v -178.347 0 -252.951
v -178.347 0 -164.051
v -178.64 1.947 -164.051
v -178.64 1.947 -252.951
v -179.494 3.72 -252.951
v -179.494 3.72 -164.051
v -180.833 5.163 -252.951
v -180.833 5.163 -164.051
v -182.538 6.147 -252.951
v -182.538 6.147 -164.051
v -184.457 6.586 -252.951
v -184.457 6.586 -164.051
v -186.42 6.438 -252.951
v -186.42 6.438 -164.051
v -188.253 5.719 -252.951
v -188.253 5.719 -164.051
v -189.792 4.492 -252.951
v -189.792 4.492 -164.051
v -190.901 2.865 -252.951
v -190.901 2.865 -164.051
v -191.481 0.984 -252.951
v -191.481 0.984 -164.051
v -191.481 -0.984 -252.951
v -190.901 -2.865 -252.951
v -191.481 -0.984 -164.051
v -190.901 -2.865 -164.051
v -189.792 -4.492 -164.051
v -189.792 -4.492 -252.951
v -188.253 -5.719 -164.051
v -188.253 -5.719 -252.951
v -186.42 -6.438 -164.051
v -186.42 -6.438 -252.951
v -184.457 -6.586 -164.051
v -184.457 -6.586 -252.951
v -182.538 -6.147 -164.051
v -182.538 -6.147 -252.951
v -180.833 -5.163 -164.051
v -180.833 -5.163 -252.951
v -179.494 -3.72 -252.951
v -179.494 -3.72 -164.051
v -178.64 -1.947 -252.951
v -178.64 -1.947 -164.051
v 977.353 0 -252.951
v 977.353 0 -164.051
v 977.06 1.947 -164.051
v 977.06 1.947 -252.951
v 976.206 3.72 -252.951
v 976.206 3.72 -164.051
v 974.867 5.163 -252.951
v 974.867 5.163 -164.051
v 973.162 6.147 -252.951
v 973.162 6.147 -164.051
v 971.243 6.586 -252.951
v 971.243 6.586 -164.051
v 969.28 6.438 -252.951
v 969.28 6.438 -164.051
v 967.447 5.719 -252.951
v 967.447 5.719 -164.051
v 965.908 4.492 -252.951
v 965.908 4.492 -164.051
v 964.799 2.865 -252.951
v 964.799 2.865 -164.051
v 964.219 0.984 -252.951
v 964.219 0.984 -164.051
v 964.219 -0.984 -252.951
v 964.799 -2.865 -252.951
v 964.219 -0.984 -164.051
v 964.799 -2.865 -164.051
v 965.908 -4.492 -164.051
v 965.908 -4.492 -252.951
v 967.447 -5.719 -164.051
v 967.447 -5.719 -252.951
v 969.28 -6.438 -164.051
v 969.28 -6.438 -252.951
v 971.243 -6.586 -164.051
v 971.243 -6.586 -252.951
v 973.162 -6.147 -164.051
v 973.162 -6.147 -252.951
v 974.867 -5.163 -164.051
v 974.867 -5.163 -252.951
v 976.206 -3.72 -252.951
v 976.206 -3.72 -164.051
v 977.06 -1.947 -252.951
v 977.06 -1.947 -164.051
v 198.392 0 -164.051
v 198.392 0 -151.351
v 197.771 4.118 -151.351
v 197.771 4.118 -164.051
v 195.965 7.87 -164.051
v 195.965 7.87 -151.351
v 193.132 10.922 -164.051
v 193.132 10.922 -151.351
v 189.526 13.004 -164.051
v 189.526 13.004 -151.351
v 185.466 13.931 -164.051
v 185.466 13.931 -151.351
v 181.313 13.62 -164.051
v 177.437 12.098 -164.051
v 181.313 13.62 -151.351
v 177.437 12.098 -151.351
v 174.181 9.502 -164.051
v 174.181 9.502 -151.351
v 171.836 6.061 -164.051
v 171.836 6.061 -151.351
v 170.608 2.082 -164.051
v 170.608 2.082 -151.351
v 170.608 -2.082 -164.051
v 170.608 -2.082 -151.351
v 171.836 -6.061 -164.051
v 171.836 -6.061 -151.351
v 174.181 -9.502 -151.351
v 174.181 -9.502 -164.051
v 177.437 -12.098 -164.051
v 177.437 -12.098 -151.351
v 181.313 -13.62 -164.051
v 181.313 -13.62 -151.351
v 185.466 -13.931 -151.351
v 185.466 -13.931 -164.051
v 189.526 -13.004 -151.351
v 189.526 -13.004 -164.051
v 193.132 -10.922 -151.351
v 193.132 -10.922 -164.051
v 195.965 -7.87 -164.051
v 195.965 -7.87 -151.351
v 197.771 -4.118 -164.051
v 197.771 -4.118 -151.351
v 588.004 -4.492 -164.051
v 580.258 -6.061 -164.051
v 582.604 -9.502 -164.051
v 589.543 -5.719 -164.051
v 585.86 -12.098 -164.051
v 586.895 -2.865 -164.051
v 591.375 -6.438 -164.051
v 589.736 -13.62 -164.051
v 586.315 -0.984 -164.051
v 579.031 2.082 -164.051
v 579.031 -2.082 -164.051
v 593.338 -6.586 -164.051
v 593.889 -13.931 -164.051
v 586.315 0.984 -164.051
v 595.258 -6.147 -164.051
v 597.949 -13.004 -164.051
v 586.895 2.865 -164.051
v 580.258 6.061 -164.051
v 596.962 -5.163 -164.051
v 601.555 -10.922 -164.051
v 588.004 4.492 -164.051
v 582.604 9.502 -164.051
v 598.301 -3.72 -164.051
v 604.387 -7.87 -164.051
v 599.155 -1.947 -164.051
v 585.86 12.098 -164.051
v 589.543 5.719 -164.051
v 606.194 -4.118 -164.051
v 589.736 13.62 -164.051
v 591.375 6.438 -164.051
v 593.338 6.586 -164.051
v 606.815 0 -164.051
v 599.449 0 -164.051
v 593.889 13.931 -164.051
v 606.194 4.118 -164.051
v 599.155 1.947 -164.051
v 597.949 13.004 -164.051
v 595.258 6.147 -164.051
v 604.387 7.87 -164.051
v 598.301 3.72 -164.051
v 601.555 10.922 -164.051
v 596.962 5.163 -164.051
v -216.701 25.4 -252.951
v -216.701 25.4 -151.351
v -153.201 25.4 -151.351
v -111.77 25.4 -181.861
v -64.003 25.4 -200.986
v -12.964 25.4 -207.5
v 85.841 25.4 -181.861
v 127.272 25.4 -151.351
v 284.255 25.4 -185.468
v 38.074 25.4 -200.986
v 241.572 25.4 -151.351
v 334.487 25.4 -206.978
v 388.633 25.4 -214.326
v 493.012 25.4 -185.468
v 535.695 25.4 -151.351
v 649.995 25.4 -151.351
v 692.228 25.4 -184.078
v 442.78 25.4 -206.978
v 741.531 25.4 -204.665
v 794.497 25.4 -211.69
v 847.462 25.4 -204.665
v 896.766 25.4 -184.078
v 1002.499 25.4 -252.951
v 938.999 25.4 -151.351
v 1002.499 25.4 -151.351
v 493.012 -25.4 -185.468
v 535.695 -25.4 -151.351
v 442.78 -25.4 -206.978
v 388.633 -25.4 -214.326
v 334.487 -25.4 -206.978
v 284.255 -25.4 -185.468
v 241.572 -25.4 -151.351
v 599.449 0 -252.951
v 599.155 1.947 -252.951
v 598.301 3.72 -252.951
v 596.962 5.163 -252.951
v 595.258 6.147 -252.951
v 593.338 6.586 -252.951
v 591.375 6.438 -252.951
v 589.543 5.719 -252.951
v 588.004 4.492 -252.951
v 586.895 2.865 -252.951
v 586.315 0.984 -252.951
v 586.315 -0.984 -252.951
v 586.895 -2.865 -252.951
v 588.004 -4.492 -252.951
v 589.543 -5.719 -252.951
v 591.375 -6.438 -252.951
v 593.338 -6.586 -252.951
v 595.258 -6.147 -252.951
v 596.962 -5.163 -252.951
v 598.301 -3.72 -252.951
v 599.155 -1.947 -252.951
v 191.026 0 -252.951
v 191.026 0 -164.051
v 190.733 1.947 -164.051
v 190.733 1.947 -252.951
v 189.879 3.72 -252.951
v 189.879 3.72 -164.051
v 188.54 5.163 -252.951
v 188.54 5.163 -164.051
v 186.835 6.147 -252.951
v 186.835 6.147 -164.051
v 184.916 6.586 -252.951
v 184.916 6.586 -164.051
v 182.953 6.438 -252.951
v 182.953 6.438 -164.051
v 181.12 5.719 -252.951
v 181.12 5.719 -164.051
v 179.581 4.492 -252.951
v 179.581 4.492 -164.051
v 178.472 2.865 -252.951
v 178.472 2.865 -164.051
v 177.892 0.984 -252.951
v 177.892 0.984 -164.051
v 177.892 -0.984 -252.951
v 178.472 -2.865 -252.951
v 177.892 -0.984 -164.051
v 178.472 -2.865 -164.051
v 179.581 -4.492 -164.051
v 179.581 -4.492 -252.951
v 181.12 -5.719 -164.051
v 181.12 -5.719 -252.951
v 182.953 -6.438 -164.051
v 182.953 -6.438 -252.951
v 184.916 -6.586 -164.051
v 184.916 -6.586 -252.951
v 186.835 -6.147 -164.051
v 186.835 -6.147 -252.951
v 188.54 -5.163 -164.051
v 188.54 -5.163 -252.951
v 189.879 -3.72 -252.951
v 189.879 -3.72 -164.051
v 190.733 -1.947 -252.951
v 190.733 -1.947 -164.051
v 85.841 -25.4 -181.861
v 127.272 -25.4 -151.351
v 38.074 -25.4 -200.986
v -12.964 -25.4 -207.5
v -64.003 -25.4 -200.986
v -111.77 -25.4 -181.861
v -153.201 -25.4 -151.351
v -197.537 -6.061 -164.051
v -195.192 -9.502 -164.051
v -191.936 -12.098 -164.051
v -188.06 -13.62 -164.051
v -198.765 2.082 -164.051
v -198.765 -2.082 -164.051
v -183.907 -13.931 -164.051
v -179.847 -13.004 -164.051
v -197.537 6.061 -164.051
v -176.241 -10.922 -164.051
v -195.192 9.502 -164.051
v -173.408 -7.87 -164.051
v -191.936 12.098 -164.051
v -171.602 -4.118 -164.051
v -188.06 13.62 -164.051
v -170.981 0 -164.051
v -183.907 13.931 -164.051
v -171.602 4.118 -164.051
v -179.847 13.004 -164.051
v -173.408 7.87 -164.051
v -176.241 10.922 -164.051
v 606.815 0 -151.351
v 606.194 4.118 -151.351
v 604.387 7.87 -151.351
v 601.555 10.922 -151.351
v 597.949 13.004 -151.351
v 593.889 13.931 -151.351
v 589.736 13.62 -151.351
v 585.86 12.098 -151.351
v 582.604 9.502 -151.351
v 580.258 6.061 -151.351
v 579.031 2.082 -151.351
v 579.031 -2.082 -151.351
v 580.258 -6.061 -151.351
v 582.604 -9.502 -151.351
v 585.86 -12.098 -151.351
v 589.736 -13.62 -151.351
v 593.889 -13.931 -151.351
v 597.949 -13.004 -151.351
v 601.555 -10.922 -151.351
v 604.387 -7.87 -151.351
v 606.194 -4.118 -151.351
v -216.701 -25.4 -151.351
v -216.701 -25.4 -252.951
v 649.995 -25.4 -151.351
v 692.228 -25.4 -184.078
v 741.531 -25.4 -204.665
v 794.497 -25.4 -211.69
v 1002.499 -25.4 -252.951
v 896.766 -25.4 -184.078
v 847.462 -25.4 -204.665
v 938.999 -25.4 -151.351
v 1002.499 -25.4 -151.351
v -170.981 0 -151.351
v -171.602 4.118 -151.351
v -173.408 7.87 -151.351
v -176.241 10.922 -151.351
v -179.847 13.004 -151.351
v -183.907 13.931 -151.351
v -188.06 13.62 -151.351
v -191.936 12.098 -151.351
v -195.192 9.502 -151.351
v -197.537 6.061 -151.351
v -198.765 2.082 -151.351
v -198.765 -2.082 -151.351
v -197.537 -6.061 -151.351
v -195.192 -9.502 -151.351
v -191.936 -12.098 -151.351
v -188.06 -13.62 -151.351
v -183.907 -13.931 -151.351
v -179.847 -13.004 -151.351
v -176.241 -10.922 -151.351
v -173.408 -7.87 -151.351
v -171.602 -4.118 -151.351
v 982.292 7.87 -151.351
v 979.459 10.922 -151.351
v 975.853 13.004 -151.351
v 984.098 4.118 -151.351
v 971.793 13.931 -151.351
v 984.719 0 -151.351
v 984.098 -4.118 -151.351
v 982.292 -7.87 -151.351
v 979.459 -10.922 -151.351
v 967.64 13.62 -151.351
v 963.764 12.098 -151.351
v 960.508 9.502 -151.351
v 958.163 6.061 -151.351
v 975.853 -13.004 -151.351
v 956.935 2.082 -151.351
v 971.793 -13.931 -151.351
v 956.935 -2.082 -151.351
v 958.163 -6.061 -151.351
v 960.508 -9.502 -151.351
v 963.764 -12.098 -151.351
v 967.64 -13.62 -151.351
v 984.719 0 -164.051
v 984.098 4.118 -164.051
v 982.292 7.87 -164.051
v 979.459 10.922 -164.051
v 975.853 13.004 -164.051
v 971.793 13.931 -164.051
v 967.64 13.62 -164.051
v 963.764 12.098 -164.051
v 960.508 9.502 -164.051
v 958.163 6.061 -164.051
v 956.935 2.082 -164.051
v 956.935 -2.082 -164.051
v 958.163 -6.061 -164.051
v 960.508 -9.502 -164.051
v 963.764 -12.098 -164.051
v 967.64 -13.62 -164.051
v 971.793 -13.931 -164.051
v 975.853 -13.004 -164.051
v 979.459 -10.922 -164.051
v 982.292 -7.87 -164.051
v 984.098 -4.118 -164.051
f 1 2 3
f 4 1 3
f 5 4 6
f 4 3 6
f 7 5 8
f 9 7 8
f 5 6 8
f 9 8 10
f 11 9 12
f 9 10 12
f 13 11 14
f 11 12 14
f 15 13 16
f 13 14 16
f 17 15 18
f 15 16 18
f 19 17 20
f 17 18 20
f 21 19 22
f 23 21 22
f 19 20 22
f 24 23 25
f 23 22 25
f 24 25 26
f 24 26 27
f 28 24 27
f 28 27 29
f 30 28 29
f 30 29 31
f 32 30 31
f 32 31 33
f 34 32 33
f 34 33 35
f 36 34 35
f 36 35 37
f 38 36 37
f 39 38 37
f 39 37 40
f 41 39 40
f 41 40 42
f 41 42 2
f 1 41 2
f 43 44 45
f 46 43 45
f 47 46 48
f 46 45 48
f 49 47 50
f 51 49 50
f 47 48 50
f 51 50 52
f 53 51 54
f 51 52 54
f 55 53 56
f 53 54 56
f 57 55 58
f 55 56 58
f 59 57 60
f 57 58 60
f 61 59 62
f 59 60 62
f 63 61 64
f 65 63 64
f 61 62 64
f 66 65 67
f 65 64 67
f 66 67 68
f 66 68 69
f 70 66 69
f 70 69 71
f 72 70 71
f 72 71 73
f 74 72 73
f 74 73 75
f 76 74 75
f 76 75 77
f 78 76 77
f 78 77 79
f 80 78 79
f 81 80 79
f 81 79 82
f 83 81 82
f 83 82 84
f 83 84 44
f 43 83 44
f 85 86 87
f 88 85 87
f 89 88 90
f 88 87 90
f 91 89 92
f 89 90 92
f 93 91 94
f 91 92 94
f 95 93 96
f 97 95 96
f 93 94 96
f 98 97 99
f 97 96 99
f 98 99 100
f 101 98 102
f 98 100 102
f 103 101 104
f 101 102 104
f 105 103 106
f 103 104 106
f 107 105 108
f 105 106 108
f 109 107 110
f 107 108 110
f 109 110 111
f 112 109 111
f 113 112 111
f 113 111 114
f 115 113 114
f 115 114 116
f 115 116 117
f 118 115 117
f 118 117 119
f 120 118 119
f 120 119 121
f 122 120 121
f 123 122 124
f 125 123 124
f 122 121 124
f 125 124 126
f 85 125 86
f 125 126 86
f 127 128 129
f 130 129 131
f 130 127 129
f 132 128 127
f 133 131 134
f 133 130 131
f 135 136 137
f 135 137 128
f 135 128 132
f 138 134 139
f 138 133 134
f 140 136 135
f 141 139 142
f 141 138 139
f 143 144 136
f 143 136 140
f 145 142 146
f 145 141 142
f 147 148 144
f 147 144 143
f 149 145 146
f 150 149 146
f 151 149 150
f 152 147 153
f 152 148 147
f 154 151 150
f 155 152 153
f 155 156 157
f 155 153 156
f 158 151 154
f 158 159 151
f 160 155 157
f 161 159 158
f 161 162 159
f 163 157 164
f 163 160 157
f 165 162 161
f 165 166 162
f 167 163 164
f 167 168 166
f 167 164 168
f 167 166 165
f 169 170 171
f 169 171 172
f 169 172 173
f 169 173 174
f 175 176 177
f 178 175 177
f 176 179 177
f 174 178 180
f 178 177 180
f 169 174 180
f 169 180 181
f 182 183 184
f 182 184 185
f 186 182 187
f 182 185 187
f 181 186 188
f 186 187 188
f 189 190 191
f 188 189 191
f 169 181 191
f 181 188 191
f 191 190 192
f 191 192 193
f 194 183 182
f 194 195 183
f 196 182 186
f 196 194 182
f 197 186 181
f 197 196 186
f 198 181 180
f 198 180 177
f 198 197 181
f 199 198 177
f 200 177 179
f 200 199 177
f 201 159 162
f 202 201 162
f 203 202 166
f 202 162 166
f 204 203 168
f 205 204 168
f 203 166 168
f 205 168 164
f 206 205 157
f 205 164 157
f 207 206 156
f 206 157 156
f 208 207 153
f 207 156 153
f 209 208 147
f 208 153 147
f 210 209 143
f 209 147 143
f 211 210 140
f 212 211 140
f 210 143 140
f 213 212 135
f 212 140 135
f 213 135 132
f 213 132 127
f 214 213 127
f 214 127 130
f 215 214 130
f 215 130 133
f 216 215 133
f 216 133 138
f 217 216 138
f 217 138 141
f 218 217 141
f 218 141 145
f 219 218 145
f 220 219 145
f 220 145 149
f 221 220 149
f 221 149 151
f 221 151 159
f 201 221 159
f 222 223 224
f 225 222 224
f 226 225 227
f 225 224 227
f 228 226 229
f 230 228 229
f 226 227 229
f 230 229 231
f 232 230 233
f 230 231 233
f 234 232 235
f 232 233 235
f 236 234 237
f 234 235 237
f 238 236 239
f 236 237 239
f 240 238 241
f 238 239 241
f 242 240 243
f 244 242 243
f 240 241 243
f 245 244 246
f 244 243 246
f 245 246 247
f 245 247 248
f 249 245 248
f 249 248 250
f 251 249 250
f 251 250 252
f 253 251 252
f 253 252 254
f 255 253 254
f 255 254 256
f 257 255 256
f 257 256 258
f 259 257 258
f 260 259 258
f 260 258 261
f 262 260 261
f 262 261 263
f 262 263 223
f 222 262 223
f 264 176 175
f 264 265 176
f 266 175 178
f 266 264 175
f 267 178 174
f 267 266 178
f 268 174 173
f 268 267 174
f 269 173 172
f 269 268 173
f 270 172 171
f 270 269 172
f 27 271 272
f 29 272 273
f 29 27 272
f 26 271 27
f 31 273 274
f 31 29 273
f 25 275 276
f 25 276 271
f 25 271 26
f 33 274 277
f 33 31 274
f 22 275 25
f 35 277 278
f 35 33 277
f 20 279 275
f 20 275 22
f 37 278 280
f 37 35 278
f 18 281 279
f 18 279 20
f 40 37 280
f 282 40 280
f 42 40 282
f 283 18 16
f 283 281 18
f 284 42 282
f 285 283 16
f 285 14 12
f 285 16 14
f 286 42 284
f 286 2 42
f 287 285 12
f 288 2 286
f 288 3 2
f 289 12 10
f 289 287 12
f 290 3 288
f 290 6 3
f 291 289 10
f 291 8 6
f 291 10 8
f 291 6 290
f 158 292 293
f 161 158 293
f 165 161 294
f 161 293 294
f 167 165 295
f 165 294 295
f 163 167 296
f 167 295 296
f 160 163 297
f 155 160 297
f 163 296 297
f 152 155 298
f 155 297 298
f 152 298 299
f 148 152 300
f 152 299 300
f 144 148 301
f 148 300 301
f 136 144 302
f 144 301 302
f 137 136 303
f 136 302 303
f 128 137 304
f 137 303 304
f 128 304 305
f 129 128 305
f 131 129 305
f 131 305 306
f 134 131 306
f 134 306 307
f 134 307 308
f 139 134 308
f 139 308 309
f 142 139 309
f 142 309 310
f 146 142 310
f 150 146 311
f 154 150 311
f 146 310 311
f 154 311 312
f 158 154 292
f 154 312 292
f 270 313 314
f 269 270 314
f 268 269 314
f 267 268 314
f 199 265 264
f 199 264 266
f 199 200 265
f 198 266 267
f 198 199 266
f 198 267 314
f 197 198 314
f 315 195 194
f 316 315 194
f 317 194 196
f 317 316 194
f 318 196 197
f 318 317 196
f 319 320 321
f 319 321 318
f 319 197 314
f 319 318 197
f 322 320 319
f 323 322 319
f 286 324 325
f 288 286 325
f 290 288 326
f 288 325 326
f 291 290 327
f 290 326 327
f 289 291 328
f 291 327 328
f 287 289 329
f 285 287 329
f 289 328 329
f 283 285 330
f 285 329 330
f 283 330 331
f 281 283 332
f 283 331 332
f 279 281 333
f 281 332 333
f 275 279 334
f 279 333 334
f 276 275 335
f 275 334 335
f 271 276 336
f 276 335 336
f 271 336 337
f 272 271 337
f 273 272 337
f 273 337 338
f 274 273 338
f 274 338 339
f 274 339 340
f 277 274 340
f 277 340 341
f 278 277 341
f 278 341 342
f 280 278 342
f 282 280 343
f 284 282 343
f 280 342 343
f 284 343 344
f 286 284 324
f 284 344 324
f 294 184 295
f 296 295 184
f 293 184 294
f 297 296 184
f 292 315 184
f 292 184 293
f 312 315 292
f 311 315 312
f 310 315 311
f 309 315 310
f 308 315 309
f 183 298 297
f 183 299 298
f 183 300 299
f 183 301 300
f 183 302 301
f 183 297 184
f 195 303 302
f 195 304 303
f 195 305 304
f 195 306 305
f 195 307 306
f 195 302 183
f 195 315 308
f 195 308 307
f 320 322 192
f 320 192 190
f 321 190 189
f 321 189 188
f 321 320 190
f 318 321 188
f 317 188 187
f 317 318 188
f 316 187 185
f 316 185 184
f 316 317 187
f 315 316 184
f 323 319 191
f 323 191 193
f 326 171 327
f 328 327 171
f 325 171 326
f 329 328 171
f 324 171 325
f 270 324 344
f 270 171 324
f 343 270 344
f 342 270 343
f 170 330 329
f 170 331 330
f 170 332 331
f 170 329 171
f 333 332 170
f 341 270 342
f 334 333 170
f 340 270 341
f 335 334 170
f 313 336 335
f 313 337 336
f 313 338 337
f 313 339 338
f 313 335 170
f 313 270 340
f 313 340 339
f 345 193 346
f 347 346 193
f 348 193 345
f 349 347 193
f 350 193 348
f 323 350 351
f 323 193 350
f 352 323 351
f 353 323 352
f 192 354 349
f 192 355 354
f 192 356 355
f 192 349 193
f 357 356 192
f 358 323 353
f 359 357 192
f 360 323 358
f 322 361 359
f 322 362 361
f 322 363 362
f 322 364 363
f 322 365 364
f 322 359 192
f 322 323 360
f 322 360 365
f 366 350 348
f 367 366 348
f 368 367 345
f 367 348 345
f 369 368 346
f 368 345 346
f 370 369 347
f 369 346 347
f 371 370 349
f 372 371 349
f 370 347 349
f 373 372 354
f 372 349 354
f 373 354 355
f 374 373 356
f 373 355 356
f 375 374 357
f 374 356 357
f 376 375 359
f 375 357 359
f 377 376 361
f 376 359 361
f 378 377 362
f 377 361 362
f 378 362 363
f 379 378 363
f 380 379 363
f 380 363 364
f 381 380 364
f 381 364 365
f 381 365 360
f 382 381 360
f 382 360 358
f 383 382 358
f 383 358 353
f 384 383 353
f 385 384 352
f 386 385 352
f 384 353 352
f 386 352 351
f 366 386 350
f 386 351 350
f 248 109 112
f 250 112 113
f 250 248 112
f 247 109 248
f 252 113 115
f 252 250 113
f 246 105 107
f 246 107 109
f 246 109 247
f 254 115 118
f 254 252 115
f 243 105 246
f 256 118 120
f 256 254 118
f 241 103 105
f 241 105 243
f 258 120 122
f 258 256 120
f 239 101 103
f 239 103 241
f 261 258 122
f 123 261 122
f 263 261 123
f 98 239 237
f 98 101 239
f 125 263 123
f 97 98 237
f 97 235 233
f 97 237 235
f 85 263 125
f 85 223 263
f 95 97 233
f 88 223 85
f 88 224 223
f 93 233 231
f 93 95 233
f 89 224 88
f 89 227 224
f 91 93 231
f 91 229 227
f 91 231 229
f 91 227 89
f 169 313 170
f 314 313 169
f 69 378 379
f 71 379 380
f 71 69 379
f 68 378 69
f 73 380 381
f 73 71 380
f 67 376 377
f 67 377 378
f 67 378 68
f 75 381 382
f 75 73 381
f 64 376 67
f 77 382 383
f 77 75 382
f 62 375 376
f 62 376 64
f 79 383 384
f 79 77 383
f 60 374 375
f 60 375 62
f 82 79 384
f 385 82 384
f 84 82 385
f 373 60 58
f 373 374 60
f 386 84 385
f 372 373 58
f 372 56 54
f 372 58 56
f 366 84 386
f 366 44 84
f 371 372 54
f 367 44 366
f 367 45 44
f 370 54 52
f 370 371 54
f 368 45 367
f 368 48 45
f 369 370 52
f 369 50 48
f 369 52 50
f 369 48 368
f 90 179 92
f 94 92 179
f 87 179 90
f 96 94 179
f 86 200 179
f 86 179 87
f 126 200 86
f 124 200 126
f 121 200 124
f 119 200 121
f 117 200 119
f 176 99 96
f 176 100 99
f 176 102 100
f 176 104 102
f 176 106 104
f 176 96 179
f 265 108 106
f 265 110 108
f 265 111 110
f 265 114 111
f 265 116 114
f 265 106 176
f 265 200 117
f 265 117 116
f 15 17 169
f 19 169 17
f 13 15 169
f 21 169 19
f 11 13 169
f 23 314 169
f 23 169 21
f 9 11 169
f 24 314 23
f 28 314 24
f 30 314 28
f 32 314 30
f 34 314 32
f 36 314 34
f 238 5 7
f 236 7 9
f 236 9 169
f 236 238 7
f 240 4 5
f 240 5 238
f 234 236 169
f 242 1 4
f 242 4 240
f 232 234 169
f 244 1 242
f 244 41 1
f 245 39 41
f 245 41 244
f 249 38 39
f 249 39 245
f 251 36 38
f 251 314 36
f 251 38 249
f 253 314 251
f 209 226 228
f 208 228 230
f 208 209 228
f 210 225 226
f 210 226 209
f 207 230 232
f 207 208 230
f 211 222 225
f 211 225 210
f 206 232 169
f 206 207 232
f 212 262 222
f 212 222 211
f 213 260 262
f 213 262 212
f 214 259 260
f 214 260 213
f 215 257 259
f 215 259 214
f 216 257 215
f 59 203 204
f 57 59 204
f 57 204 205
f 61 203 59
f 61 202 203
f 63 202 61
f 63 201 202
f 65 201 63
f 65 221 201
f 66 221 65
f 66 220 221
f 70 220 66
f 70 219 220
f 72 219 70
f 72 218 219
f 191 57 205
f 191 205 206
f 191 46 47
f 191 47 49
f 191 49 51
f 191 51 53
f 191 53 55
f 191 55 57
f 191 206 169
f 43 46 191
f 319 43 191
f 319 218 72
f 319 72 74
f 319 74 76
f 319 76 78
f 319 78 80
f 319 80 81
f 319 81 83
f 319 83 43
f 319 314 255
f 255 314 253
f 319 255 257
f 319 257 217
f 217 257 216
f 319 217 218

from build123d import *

# Parameters (mm, degrees)
F1_DEPTH  = 25.4
F2_R      = 6.604
F3_DEPTH  = 101.601
F4_R      = 13.97
F5_DEPTH  = 12.7
F6_R      = 6.604
F7_DEPTH  = 101.601
F8_R      = 13.97
F9_DEPTH  = 12.7
F10_R     = 6.604
F11_DEPTH = 101.601
F12_R     = 13.97
F13_DEPTH = 12.7
F14_R     = 6.604
F15_DEPTH = 101.601
F16_R     = 13.97
F17_DEPTH = 12.7


with BuildPart() as f1:
    # F0 (on Front) → F1 (new body, symmetric)
    with BuildSketch(Plane.XZ):
        with BuildLine():
            ThreePointArc((127.27204, -151.351064), (-12.964423, -207.50014), (-153.200886, -151.351064))
            Line((-153.200886, -151.351064), (-216.700886, -151.351064))
            Line((-216.700886, -151.351064), (-216.700886, -252.951064))
            Line((-216.700886, -252.951064), (1002.499114, -252.951064))
            Line((1002.499114, -252.951064), (1002.499114, -151.351064))
            Line((1002.499114, -151.351064), (938.999114, -151.351064))
            ThreePointArc((938.999114, -151.351064), (794.496976, -211.689691), (649.994838, -151.351064))
            Line((649.994838, -151.351064), (535.694838, -151.351064))
            ThreePointArc((535.694838, -151.351064), (388.633439, -214.325586), (241.57204, -151.351064))
            Line((241.57204, -151.351064), (127.27204, -151.351064))
        make_face()
    extrude(amount=F1_DEPTH, both=True)

    # F2 (on face) → F3 (cut, through all)
    with BuildSketch(Plane.XY.offset(-151.351064)):
        with Locations((-184.950886, 0)):
            Circle(F2_R)
    extrude(amount=-F3_DEPTH, mode=Mode.SUBTRACT)

    # F4 (on face) → F5 (cut)
    with BuildSketch(Plane.XY.offset(-151.351064)):
        with Locations((-184.950886, 0)):
            Circle(F4_R)
    extrude(amount=-F5_DEPTH, mode=Mode.SUBTRACT)

    # F6 (on face) → F7 (cut, through all)
    with BuildSketch(Plane.XY.offset(-151.351064)):
        with Locations((184.42204, 0)):
            Circle(F6_R)
    extrude(amount=-F7_DEPTH, mode=Mode.SUBTRACT)

    # F8 (on face) → F9 (cut)
    with BuildSketch(Plane.XY.offset(-151.351064)):
        with Locations((184.42204, 0)):
            Circle(F8_R)
    extrude(amount=-F9_DEPTH, mode=Mode.SUBTRACT)

    # F10 (on face) → F11 (cut, through all)
    with BuildSketch(Plane.XY.offset(-151.351064)):
        with Locations((592.844838, 0)):
            Circle(F10_R)
    extrude(amount=-F11_DEPTH, mode=Mode.SUBTRACT)

    # F12 (on face) → F13 (cut)
    with BuildSketch(Plane.XY.offset(-151.351064)):
        with Locations((592.844838, 0)):
            Circle(F12_R)
    extrude(amount=-F13_DEPTH, mode=Mode.SUBTRACT)

    # F14 (on face) → F15 (cut, through all)
    with BuildSketch(Plane.XY.offset(-151.351064)):
        with Locations((970.749114, 0)):
            Circle(F14_R)
    extrude(amount=-F15_DEPTH, mode=Mode.SUBTRACT)

    # F16 (on face) → F17 (cut)
    with BuildSketch(Plane.XY.offset(-151.351064)):
        with Locations((970.749114, 0)):
            Circle(F16_R)
    extrude(amount=-F17_DEPTH, mode=Mode.SUBTRACT)


solid = f1.part
